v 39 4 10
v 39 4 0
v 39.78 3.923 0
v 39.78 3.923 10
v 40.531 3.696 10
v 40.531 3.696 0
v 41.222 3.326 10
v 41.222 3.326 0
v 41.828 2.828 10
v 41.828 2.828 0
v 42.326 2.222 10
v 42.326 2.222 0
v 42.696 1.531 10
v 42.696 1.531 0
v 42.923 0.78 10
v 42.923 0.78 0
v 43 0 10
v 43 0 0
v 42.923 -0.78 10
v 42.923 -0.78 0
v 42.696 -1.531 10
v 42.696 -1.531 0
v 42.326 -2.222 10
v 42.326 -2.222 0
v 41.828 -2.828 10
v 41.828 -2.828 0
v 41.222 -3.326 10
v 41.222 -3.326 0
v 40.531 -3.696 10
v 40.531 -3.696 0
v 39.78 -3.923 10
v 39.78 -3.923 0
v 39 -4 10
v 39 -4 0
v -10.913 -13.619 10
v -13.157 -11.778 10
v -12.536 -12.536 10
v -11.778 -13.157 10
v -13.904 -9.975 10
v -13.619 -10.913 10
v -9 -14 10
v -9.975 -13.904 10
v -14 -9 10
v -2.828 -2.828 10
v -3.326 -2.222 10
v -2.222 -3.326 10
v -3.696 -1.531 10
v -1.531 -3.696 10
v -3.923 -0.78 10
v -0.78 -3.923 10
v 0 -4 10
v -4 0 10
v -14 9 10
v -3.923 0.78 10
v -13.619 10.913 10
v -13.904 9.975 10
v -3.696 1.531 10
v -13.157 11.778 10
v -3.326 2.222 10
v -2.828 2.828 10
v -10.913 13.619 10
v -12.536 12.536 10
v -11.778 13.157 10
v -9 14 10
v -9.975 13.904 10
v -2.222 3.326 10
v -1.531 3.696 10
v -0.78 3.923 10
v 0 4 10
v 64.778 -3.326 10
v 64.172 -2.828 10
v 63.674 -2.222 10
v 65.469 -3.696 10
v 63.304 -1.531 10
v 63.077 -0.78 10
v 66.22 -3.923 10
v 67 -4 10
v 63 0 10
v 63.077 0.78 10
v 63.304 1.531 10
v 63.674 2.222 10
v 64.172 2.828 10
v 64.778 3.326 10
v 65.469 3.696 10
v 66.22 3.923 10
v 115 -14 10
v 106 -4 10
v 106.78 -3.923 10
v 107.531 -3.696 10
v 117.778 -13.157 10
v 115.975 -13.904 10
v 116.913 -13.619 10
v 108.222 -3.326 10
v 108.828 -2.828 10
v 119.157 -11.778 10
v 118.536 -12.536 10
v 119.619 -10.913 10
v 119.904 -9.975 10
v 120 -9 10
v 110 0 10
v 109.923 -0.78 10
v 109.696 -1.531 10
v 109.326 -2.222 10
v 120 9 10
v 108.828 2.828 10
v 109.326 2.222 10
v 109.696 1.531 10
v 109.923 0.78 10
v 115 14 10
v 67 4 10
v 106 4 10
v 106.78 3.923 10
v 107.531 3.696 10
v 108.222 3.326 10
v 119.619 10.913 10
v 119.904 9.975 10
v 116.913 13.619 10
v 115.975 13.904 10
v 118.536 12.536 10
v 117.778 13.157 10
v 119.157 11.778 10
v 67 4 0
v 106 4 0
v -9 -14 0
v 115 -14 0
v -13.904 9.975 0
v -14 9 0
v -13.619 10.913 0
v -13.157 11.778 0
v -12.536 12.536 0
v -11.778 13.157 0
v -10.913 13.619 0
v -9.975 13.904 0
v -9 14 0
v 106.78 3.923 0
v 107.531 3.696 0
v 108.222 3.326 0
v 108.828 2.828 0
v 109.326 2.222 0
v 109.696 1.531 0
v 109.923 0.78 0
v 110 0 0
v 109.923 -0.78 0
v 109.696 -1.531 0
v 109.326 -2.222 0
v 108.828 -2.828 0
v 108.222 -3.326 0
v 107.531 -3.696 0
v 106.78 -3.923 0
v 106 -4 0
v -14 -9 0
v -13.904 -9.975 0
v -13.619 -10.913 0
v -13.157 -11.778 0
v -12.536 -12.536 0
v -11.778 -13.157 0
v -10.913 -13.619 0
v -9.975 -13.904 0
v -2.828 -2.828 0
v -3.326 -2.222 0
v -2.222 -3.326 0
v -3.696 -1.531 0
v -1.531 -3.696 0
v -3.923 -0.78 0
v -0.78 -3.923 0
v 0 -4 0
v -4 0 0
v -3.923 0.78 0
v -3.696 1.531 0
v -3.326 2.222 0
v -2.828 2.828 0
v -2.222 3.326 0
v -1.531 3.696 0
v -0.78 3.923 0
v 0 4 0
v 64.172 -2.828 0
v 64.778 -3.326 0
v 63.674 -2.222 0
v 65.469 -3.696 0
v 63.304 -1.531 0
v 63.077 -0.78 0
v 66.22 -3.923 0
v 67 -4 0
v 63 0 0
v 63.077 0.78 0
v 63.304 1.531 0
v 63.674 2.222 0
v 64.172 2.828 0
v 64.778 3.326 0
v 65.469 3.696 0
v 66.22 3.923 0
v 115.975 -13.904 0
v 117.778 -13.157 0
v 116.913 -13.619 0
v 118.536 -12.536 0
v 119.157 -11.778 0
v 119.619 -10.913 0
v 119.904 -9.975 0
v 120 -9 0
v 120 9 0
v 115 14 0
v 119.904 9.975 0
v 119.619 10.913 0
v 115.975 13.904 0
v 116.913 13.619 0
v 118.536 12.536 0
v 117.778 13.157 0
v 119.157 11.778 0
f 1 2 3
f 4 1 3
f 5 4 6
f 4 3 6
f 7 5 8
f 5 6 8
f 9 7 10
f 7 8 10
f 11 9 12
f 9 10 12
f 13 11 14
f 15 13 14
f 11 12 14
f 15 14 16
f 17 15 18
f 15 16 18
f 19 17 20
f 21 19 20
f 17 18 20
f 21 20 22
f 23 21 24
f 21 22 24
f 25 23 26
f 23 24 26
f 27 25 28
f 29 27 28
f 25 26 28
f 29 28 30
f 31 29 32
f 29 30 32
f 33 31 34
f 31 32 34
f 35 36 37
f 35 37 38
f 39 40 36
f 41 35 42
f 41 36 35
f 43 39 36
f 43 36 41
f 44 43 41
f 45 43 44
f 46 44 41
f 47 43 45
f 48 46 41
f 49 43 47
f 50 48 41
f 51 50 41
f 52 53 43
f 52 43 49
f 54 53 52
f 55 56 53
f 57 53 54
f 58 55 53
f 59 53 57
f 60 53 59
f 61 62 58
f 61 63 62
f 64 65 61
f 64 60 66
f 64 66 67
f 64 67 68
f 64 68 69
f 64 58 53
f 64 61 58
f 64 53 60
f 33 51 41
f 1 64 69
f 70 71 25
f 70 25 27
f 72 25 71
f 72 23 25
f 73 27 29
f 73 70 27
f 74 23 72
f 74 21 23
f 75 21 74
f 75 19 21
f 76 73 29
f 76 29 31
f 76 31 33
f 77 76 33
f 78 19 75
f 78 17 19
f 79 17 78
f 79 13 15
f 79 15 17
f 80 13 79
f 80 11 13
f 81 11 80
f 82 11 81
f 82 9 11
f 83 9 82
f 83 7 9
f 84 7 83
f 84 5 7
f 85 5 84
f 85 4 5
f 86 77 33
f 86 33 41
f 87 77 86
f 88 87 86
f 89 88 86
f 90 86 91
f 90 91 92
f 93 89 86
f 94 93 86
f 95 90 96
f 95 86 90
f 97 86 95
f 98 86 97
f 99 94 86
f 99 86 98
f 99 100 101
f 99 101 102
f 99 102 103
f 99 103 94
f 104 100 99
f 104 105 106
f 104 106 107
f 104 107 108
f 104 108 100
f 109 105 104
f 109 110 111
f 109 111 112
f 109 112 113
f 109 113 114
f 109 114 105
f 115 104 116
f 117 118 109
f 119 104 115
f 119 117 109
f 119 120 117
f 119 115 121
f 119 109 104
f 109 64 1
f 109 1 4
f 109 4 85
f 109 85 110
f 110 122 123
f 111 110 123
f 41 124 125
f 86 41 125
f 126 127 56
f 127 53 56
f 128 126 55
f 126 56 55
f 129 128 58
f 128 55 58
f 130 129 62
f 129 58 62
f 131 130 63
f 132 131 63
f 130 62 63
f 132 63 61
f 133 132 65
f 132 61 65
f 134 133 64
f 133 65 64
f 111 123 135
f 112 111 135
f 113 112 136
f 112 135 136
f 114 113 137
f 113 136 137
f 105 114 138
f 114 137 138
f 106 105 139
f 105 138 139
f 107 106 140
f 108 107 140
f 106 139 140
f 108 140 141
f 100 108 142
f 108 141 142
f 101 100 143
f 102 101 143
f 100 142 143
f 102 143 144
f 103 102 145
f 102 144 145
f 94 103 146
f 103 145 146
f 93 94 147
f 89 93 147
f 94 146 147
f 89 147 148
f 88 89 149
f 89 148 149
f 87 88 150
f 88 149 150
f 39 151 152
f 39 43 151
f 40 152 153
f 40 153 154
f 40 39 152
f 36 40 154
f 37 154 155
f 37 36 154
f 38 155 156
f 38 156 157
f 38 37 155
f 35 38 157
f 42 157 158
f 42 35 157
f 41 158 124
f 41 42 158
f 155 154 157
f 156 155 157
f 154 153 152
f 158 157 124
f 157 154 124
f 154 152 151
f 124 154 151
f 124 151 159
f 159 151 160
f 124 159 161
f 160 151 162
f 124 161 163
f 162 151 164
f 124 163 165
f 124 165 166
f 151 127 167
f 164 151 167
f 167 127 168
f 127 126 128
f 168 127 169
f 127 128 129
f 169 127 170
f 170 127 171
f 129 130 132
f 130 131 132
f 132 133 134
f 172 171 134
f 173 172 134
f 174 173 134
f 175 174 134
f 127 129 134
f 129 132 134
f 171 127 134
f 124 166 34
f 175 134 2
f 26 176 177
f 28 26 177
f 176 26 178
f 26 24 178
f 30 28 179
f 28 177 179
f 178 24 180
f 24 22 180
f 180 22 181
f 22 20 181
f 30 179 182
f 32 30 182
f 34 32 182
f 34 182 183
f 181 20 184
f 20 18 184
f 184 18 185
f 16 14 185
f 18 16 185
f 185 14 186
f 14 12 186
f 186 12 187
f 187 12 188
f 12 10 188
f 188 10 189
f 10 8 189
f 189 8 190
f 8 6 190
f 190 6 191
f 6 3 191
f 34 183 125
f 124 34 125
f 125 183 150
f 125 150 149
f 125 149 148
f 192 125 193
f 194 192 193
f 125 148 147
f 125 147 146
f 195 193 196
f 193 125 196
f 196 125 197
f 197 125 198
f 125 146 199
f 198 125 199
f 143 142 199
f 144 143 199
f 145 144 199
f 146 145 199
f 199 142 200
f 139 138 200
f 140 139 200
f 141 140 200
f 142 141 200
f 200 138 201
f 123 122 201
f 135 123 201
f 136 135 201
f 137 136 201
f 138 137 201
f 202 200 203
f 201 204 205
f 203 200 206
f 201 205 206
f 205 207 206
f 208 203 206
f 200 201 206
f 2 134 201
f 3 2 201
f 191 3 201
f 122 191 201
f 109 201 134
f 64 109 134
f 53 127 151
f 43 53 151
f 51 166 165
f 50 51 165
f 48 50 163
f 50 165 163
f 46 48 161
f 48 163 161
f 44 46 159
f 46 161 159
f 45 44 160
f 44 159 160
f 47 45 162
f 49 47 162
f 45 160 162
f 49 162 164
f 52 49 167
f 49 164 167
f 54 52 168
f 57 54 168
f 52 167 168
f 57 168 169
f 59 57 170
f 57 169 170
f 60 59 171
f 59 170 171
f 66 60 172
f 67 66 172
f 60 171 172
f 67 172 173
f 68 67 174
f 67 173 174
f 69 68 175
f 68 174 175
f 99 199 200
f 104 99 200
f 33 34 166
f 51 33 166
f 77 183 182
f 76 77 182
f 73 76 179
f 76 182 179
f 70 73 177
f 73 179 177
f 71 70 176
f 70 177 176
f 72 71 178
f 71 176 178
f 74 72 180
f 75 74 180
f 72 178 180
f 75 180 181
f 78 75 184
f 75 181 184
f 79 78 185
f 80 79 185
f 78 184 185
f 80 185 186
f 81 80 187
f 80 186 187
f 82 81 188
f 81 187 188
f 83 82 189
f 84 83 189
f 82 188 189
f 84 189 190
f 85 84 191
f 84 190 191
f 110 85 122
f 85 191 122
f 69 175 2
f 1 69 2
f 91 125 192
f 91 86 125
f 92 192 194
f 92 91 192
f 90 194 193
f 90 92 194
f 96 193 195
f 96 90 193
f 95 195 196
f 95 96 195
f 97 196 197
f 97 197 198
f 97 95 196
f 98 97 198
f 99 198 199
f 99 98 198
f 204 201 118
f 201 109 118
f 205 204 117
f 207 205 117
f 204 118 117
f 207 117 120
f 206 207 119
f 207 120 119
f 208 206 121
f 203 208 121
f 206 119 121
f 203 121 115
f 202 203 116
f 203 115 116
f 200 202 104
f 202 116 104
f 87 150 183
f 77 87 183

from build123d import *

# Parameters (mm, degrees)
F1_DEPTH = 10
F2_R     = 5


with BuildPart() as f1:
    # F0 (on Top) → F1 (new body)
    with BuildSketch(Plane.XY):
        Polygon((53, 14), (-14, 14), (-14, -14), (53, -14), (120, -14), (120, 14), align=None)
        with BuildLine():
            ThreePointArc((0, -4), (-4, 0), (0, 4))
            Line((0, 4), (39, 4))
            ThreePointArc((39, 4), (43, 0), (39, -4))
            Line((39, -4), (0, -4))
        make_face(mode=Mode.SUBTRACT)
        with BuildLine():
            Line((67, 4), (106, 4))
            ThreePointArc((106, 4), (110, 0), (106, -4))
            Line((106, -4), (67, -4))
            ThreePointArc((67, -4), (63, 0), (67, 4))
        make_face(mode=Mode.SUBTRACT)
    extrude(amount=F1_DEPTH)

    # F2
    f2_edges = [f1.edges().sort_by_distance(p)[0] for p in [
        (-14, 14, 5),
        (-14, -14, 5),
        (120, -14, 5),
        (120, 14, 5),
    ]]
    fillet(f2_edges, radius=F2_R)


solid = f1.part
